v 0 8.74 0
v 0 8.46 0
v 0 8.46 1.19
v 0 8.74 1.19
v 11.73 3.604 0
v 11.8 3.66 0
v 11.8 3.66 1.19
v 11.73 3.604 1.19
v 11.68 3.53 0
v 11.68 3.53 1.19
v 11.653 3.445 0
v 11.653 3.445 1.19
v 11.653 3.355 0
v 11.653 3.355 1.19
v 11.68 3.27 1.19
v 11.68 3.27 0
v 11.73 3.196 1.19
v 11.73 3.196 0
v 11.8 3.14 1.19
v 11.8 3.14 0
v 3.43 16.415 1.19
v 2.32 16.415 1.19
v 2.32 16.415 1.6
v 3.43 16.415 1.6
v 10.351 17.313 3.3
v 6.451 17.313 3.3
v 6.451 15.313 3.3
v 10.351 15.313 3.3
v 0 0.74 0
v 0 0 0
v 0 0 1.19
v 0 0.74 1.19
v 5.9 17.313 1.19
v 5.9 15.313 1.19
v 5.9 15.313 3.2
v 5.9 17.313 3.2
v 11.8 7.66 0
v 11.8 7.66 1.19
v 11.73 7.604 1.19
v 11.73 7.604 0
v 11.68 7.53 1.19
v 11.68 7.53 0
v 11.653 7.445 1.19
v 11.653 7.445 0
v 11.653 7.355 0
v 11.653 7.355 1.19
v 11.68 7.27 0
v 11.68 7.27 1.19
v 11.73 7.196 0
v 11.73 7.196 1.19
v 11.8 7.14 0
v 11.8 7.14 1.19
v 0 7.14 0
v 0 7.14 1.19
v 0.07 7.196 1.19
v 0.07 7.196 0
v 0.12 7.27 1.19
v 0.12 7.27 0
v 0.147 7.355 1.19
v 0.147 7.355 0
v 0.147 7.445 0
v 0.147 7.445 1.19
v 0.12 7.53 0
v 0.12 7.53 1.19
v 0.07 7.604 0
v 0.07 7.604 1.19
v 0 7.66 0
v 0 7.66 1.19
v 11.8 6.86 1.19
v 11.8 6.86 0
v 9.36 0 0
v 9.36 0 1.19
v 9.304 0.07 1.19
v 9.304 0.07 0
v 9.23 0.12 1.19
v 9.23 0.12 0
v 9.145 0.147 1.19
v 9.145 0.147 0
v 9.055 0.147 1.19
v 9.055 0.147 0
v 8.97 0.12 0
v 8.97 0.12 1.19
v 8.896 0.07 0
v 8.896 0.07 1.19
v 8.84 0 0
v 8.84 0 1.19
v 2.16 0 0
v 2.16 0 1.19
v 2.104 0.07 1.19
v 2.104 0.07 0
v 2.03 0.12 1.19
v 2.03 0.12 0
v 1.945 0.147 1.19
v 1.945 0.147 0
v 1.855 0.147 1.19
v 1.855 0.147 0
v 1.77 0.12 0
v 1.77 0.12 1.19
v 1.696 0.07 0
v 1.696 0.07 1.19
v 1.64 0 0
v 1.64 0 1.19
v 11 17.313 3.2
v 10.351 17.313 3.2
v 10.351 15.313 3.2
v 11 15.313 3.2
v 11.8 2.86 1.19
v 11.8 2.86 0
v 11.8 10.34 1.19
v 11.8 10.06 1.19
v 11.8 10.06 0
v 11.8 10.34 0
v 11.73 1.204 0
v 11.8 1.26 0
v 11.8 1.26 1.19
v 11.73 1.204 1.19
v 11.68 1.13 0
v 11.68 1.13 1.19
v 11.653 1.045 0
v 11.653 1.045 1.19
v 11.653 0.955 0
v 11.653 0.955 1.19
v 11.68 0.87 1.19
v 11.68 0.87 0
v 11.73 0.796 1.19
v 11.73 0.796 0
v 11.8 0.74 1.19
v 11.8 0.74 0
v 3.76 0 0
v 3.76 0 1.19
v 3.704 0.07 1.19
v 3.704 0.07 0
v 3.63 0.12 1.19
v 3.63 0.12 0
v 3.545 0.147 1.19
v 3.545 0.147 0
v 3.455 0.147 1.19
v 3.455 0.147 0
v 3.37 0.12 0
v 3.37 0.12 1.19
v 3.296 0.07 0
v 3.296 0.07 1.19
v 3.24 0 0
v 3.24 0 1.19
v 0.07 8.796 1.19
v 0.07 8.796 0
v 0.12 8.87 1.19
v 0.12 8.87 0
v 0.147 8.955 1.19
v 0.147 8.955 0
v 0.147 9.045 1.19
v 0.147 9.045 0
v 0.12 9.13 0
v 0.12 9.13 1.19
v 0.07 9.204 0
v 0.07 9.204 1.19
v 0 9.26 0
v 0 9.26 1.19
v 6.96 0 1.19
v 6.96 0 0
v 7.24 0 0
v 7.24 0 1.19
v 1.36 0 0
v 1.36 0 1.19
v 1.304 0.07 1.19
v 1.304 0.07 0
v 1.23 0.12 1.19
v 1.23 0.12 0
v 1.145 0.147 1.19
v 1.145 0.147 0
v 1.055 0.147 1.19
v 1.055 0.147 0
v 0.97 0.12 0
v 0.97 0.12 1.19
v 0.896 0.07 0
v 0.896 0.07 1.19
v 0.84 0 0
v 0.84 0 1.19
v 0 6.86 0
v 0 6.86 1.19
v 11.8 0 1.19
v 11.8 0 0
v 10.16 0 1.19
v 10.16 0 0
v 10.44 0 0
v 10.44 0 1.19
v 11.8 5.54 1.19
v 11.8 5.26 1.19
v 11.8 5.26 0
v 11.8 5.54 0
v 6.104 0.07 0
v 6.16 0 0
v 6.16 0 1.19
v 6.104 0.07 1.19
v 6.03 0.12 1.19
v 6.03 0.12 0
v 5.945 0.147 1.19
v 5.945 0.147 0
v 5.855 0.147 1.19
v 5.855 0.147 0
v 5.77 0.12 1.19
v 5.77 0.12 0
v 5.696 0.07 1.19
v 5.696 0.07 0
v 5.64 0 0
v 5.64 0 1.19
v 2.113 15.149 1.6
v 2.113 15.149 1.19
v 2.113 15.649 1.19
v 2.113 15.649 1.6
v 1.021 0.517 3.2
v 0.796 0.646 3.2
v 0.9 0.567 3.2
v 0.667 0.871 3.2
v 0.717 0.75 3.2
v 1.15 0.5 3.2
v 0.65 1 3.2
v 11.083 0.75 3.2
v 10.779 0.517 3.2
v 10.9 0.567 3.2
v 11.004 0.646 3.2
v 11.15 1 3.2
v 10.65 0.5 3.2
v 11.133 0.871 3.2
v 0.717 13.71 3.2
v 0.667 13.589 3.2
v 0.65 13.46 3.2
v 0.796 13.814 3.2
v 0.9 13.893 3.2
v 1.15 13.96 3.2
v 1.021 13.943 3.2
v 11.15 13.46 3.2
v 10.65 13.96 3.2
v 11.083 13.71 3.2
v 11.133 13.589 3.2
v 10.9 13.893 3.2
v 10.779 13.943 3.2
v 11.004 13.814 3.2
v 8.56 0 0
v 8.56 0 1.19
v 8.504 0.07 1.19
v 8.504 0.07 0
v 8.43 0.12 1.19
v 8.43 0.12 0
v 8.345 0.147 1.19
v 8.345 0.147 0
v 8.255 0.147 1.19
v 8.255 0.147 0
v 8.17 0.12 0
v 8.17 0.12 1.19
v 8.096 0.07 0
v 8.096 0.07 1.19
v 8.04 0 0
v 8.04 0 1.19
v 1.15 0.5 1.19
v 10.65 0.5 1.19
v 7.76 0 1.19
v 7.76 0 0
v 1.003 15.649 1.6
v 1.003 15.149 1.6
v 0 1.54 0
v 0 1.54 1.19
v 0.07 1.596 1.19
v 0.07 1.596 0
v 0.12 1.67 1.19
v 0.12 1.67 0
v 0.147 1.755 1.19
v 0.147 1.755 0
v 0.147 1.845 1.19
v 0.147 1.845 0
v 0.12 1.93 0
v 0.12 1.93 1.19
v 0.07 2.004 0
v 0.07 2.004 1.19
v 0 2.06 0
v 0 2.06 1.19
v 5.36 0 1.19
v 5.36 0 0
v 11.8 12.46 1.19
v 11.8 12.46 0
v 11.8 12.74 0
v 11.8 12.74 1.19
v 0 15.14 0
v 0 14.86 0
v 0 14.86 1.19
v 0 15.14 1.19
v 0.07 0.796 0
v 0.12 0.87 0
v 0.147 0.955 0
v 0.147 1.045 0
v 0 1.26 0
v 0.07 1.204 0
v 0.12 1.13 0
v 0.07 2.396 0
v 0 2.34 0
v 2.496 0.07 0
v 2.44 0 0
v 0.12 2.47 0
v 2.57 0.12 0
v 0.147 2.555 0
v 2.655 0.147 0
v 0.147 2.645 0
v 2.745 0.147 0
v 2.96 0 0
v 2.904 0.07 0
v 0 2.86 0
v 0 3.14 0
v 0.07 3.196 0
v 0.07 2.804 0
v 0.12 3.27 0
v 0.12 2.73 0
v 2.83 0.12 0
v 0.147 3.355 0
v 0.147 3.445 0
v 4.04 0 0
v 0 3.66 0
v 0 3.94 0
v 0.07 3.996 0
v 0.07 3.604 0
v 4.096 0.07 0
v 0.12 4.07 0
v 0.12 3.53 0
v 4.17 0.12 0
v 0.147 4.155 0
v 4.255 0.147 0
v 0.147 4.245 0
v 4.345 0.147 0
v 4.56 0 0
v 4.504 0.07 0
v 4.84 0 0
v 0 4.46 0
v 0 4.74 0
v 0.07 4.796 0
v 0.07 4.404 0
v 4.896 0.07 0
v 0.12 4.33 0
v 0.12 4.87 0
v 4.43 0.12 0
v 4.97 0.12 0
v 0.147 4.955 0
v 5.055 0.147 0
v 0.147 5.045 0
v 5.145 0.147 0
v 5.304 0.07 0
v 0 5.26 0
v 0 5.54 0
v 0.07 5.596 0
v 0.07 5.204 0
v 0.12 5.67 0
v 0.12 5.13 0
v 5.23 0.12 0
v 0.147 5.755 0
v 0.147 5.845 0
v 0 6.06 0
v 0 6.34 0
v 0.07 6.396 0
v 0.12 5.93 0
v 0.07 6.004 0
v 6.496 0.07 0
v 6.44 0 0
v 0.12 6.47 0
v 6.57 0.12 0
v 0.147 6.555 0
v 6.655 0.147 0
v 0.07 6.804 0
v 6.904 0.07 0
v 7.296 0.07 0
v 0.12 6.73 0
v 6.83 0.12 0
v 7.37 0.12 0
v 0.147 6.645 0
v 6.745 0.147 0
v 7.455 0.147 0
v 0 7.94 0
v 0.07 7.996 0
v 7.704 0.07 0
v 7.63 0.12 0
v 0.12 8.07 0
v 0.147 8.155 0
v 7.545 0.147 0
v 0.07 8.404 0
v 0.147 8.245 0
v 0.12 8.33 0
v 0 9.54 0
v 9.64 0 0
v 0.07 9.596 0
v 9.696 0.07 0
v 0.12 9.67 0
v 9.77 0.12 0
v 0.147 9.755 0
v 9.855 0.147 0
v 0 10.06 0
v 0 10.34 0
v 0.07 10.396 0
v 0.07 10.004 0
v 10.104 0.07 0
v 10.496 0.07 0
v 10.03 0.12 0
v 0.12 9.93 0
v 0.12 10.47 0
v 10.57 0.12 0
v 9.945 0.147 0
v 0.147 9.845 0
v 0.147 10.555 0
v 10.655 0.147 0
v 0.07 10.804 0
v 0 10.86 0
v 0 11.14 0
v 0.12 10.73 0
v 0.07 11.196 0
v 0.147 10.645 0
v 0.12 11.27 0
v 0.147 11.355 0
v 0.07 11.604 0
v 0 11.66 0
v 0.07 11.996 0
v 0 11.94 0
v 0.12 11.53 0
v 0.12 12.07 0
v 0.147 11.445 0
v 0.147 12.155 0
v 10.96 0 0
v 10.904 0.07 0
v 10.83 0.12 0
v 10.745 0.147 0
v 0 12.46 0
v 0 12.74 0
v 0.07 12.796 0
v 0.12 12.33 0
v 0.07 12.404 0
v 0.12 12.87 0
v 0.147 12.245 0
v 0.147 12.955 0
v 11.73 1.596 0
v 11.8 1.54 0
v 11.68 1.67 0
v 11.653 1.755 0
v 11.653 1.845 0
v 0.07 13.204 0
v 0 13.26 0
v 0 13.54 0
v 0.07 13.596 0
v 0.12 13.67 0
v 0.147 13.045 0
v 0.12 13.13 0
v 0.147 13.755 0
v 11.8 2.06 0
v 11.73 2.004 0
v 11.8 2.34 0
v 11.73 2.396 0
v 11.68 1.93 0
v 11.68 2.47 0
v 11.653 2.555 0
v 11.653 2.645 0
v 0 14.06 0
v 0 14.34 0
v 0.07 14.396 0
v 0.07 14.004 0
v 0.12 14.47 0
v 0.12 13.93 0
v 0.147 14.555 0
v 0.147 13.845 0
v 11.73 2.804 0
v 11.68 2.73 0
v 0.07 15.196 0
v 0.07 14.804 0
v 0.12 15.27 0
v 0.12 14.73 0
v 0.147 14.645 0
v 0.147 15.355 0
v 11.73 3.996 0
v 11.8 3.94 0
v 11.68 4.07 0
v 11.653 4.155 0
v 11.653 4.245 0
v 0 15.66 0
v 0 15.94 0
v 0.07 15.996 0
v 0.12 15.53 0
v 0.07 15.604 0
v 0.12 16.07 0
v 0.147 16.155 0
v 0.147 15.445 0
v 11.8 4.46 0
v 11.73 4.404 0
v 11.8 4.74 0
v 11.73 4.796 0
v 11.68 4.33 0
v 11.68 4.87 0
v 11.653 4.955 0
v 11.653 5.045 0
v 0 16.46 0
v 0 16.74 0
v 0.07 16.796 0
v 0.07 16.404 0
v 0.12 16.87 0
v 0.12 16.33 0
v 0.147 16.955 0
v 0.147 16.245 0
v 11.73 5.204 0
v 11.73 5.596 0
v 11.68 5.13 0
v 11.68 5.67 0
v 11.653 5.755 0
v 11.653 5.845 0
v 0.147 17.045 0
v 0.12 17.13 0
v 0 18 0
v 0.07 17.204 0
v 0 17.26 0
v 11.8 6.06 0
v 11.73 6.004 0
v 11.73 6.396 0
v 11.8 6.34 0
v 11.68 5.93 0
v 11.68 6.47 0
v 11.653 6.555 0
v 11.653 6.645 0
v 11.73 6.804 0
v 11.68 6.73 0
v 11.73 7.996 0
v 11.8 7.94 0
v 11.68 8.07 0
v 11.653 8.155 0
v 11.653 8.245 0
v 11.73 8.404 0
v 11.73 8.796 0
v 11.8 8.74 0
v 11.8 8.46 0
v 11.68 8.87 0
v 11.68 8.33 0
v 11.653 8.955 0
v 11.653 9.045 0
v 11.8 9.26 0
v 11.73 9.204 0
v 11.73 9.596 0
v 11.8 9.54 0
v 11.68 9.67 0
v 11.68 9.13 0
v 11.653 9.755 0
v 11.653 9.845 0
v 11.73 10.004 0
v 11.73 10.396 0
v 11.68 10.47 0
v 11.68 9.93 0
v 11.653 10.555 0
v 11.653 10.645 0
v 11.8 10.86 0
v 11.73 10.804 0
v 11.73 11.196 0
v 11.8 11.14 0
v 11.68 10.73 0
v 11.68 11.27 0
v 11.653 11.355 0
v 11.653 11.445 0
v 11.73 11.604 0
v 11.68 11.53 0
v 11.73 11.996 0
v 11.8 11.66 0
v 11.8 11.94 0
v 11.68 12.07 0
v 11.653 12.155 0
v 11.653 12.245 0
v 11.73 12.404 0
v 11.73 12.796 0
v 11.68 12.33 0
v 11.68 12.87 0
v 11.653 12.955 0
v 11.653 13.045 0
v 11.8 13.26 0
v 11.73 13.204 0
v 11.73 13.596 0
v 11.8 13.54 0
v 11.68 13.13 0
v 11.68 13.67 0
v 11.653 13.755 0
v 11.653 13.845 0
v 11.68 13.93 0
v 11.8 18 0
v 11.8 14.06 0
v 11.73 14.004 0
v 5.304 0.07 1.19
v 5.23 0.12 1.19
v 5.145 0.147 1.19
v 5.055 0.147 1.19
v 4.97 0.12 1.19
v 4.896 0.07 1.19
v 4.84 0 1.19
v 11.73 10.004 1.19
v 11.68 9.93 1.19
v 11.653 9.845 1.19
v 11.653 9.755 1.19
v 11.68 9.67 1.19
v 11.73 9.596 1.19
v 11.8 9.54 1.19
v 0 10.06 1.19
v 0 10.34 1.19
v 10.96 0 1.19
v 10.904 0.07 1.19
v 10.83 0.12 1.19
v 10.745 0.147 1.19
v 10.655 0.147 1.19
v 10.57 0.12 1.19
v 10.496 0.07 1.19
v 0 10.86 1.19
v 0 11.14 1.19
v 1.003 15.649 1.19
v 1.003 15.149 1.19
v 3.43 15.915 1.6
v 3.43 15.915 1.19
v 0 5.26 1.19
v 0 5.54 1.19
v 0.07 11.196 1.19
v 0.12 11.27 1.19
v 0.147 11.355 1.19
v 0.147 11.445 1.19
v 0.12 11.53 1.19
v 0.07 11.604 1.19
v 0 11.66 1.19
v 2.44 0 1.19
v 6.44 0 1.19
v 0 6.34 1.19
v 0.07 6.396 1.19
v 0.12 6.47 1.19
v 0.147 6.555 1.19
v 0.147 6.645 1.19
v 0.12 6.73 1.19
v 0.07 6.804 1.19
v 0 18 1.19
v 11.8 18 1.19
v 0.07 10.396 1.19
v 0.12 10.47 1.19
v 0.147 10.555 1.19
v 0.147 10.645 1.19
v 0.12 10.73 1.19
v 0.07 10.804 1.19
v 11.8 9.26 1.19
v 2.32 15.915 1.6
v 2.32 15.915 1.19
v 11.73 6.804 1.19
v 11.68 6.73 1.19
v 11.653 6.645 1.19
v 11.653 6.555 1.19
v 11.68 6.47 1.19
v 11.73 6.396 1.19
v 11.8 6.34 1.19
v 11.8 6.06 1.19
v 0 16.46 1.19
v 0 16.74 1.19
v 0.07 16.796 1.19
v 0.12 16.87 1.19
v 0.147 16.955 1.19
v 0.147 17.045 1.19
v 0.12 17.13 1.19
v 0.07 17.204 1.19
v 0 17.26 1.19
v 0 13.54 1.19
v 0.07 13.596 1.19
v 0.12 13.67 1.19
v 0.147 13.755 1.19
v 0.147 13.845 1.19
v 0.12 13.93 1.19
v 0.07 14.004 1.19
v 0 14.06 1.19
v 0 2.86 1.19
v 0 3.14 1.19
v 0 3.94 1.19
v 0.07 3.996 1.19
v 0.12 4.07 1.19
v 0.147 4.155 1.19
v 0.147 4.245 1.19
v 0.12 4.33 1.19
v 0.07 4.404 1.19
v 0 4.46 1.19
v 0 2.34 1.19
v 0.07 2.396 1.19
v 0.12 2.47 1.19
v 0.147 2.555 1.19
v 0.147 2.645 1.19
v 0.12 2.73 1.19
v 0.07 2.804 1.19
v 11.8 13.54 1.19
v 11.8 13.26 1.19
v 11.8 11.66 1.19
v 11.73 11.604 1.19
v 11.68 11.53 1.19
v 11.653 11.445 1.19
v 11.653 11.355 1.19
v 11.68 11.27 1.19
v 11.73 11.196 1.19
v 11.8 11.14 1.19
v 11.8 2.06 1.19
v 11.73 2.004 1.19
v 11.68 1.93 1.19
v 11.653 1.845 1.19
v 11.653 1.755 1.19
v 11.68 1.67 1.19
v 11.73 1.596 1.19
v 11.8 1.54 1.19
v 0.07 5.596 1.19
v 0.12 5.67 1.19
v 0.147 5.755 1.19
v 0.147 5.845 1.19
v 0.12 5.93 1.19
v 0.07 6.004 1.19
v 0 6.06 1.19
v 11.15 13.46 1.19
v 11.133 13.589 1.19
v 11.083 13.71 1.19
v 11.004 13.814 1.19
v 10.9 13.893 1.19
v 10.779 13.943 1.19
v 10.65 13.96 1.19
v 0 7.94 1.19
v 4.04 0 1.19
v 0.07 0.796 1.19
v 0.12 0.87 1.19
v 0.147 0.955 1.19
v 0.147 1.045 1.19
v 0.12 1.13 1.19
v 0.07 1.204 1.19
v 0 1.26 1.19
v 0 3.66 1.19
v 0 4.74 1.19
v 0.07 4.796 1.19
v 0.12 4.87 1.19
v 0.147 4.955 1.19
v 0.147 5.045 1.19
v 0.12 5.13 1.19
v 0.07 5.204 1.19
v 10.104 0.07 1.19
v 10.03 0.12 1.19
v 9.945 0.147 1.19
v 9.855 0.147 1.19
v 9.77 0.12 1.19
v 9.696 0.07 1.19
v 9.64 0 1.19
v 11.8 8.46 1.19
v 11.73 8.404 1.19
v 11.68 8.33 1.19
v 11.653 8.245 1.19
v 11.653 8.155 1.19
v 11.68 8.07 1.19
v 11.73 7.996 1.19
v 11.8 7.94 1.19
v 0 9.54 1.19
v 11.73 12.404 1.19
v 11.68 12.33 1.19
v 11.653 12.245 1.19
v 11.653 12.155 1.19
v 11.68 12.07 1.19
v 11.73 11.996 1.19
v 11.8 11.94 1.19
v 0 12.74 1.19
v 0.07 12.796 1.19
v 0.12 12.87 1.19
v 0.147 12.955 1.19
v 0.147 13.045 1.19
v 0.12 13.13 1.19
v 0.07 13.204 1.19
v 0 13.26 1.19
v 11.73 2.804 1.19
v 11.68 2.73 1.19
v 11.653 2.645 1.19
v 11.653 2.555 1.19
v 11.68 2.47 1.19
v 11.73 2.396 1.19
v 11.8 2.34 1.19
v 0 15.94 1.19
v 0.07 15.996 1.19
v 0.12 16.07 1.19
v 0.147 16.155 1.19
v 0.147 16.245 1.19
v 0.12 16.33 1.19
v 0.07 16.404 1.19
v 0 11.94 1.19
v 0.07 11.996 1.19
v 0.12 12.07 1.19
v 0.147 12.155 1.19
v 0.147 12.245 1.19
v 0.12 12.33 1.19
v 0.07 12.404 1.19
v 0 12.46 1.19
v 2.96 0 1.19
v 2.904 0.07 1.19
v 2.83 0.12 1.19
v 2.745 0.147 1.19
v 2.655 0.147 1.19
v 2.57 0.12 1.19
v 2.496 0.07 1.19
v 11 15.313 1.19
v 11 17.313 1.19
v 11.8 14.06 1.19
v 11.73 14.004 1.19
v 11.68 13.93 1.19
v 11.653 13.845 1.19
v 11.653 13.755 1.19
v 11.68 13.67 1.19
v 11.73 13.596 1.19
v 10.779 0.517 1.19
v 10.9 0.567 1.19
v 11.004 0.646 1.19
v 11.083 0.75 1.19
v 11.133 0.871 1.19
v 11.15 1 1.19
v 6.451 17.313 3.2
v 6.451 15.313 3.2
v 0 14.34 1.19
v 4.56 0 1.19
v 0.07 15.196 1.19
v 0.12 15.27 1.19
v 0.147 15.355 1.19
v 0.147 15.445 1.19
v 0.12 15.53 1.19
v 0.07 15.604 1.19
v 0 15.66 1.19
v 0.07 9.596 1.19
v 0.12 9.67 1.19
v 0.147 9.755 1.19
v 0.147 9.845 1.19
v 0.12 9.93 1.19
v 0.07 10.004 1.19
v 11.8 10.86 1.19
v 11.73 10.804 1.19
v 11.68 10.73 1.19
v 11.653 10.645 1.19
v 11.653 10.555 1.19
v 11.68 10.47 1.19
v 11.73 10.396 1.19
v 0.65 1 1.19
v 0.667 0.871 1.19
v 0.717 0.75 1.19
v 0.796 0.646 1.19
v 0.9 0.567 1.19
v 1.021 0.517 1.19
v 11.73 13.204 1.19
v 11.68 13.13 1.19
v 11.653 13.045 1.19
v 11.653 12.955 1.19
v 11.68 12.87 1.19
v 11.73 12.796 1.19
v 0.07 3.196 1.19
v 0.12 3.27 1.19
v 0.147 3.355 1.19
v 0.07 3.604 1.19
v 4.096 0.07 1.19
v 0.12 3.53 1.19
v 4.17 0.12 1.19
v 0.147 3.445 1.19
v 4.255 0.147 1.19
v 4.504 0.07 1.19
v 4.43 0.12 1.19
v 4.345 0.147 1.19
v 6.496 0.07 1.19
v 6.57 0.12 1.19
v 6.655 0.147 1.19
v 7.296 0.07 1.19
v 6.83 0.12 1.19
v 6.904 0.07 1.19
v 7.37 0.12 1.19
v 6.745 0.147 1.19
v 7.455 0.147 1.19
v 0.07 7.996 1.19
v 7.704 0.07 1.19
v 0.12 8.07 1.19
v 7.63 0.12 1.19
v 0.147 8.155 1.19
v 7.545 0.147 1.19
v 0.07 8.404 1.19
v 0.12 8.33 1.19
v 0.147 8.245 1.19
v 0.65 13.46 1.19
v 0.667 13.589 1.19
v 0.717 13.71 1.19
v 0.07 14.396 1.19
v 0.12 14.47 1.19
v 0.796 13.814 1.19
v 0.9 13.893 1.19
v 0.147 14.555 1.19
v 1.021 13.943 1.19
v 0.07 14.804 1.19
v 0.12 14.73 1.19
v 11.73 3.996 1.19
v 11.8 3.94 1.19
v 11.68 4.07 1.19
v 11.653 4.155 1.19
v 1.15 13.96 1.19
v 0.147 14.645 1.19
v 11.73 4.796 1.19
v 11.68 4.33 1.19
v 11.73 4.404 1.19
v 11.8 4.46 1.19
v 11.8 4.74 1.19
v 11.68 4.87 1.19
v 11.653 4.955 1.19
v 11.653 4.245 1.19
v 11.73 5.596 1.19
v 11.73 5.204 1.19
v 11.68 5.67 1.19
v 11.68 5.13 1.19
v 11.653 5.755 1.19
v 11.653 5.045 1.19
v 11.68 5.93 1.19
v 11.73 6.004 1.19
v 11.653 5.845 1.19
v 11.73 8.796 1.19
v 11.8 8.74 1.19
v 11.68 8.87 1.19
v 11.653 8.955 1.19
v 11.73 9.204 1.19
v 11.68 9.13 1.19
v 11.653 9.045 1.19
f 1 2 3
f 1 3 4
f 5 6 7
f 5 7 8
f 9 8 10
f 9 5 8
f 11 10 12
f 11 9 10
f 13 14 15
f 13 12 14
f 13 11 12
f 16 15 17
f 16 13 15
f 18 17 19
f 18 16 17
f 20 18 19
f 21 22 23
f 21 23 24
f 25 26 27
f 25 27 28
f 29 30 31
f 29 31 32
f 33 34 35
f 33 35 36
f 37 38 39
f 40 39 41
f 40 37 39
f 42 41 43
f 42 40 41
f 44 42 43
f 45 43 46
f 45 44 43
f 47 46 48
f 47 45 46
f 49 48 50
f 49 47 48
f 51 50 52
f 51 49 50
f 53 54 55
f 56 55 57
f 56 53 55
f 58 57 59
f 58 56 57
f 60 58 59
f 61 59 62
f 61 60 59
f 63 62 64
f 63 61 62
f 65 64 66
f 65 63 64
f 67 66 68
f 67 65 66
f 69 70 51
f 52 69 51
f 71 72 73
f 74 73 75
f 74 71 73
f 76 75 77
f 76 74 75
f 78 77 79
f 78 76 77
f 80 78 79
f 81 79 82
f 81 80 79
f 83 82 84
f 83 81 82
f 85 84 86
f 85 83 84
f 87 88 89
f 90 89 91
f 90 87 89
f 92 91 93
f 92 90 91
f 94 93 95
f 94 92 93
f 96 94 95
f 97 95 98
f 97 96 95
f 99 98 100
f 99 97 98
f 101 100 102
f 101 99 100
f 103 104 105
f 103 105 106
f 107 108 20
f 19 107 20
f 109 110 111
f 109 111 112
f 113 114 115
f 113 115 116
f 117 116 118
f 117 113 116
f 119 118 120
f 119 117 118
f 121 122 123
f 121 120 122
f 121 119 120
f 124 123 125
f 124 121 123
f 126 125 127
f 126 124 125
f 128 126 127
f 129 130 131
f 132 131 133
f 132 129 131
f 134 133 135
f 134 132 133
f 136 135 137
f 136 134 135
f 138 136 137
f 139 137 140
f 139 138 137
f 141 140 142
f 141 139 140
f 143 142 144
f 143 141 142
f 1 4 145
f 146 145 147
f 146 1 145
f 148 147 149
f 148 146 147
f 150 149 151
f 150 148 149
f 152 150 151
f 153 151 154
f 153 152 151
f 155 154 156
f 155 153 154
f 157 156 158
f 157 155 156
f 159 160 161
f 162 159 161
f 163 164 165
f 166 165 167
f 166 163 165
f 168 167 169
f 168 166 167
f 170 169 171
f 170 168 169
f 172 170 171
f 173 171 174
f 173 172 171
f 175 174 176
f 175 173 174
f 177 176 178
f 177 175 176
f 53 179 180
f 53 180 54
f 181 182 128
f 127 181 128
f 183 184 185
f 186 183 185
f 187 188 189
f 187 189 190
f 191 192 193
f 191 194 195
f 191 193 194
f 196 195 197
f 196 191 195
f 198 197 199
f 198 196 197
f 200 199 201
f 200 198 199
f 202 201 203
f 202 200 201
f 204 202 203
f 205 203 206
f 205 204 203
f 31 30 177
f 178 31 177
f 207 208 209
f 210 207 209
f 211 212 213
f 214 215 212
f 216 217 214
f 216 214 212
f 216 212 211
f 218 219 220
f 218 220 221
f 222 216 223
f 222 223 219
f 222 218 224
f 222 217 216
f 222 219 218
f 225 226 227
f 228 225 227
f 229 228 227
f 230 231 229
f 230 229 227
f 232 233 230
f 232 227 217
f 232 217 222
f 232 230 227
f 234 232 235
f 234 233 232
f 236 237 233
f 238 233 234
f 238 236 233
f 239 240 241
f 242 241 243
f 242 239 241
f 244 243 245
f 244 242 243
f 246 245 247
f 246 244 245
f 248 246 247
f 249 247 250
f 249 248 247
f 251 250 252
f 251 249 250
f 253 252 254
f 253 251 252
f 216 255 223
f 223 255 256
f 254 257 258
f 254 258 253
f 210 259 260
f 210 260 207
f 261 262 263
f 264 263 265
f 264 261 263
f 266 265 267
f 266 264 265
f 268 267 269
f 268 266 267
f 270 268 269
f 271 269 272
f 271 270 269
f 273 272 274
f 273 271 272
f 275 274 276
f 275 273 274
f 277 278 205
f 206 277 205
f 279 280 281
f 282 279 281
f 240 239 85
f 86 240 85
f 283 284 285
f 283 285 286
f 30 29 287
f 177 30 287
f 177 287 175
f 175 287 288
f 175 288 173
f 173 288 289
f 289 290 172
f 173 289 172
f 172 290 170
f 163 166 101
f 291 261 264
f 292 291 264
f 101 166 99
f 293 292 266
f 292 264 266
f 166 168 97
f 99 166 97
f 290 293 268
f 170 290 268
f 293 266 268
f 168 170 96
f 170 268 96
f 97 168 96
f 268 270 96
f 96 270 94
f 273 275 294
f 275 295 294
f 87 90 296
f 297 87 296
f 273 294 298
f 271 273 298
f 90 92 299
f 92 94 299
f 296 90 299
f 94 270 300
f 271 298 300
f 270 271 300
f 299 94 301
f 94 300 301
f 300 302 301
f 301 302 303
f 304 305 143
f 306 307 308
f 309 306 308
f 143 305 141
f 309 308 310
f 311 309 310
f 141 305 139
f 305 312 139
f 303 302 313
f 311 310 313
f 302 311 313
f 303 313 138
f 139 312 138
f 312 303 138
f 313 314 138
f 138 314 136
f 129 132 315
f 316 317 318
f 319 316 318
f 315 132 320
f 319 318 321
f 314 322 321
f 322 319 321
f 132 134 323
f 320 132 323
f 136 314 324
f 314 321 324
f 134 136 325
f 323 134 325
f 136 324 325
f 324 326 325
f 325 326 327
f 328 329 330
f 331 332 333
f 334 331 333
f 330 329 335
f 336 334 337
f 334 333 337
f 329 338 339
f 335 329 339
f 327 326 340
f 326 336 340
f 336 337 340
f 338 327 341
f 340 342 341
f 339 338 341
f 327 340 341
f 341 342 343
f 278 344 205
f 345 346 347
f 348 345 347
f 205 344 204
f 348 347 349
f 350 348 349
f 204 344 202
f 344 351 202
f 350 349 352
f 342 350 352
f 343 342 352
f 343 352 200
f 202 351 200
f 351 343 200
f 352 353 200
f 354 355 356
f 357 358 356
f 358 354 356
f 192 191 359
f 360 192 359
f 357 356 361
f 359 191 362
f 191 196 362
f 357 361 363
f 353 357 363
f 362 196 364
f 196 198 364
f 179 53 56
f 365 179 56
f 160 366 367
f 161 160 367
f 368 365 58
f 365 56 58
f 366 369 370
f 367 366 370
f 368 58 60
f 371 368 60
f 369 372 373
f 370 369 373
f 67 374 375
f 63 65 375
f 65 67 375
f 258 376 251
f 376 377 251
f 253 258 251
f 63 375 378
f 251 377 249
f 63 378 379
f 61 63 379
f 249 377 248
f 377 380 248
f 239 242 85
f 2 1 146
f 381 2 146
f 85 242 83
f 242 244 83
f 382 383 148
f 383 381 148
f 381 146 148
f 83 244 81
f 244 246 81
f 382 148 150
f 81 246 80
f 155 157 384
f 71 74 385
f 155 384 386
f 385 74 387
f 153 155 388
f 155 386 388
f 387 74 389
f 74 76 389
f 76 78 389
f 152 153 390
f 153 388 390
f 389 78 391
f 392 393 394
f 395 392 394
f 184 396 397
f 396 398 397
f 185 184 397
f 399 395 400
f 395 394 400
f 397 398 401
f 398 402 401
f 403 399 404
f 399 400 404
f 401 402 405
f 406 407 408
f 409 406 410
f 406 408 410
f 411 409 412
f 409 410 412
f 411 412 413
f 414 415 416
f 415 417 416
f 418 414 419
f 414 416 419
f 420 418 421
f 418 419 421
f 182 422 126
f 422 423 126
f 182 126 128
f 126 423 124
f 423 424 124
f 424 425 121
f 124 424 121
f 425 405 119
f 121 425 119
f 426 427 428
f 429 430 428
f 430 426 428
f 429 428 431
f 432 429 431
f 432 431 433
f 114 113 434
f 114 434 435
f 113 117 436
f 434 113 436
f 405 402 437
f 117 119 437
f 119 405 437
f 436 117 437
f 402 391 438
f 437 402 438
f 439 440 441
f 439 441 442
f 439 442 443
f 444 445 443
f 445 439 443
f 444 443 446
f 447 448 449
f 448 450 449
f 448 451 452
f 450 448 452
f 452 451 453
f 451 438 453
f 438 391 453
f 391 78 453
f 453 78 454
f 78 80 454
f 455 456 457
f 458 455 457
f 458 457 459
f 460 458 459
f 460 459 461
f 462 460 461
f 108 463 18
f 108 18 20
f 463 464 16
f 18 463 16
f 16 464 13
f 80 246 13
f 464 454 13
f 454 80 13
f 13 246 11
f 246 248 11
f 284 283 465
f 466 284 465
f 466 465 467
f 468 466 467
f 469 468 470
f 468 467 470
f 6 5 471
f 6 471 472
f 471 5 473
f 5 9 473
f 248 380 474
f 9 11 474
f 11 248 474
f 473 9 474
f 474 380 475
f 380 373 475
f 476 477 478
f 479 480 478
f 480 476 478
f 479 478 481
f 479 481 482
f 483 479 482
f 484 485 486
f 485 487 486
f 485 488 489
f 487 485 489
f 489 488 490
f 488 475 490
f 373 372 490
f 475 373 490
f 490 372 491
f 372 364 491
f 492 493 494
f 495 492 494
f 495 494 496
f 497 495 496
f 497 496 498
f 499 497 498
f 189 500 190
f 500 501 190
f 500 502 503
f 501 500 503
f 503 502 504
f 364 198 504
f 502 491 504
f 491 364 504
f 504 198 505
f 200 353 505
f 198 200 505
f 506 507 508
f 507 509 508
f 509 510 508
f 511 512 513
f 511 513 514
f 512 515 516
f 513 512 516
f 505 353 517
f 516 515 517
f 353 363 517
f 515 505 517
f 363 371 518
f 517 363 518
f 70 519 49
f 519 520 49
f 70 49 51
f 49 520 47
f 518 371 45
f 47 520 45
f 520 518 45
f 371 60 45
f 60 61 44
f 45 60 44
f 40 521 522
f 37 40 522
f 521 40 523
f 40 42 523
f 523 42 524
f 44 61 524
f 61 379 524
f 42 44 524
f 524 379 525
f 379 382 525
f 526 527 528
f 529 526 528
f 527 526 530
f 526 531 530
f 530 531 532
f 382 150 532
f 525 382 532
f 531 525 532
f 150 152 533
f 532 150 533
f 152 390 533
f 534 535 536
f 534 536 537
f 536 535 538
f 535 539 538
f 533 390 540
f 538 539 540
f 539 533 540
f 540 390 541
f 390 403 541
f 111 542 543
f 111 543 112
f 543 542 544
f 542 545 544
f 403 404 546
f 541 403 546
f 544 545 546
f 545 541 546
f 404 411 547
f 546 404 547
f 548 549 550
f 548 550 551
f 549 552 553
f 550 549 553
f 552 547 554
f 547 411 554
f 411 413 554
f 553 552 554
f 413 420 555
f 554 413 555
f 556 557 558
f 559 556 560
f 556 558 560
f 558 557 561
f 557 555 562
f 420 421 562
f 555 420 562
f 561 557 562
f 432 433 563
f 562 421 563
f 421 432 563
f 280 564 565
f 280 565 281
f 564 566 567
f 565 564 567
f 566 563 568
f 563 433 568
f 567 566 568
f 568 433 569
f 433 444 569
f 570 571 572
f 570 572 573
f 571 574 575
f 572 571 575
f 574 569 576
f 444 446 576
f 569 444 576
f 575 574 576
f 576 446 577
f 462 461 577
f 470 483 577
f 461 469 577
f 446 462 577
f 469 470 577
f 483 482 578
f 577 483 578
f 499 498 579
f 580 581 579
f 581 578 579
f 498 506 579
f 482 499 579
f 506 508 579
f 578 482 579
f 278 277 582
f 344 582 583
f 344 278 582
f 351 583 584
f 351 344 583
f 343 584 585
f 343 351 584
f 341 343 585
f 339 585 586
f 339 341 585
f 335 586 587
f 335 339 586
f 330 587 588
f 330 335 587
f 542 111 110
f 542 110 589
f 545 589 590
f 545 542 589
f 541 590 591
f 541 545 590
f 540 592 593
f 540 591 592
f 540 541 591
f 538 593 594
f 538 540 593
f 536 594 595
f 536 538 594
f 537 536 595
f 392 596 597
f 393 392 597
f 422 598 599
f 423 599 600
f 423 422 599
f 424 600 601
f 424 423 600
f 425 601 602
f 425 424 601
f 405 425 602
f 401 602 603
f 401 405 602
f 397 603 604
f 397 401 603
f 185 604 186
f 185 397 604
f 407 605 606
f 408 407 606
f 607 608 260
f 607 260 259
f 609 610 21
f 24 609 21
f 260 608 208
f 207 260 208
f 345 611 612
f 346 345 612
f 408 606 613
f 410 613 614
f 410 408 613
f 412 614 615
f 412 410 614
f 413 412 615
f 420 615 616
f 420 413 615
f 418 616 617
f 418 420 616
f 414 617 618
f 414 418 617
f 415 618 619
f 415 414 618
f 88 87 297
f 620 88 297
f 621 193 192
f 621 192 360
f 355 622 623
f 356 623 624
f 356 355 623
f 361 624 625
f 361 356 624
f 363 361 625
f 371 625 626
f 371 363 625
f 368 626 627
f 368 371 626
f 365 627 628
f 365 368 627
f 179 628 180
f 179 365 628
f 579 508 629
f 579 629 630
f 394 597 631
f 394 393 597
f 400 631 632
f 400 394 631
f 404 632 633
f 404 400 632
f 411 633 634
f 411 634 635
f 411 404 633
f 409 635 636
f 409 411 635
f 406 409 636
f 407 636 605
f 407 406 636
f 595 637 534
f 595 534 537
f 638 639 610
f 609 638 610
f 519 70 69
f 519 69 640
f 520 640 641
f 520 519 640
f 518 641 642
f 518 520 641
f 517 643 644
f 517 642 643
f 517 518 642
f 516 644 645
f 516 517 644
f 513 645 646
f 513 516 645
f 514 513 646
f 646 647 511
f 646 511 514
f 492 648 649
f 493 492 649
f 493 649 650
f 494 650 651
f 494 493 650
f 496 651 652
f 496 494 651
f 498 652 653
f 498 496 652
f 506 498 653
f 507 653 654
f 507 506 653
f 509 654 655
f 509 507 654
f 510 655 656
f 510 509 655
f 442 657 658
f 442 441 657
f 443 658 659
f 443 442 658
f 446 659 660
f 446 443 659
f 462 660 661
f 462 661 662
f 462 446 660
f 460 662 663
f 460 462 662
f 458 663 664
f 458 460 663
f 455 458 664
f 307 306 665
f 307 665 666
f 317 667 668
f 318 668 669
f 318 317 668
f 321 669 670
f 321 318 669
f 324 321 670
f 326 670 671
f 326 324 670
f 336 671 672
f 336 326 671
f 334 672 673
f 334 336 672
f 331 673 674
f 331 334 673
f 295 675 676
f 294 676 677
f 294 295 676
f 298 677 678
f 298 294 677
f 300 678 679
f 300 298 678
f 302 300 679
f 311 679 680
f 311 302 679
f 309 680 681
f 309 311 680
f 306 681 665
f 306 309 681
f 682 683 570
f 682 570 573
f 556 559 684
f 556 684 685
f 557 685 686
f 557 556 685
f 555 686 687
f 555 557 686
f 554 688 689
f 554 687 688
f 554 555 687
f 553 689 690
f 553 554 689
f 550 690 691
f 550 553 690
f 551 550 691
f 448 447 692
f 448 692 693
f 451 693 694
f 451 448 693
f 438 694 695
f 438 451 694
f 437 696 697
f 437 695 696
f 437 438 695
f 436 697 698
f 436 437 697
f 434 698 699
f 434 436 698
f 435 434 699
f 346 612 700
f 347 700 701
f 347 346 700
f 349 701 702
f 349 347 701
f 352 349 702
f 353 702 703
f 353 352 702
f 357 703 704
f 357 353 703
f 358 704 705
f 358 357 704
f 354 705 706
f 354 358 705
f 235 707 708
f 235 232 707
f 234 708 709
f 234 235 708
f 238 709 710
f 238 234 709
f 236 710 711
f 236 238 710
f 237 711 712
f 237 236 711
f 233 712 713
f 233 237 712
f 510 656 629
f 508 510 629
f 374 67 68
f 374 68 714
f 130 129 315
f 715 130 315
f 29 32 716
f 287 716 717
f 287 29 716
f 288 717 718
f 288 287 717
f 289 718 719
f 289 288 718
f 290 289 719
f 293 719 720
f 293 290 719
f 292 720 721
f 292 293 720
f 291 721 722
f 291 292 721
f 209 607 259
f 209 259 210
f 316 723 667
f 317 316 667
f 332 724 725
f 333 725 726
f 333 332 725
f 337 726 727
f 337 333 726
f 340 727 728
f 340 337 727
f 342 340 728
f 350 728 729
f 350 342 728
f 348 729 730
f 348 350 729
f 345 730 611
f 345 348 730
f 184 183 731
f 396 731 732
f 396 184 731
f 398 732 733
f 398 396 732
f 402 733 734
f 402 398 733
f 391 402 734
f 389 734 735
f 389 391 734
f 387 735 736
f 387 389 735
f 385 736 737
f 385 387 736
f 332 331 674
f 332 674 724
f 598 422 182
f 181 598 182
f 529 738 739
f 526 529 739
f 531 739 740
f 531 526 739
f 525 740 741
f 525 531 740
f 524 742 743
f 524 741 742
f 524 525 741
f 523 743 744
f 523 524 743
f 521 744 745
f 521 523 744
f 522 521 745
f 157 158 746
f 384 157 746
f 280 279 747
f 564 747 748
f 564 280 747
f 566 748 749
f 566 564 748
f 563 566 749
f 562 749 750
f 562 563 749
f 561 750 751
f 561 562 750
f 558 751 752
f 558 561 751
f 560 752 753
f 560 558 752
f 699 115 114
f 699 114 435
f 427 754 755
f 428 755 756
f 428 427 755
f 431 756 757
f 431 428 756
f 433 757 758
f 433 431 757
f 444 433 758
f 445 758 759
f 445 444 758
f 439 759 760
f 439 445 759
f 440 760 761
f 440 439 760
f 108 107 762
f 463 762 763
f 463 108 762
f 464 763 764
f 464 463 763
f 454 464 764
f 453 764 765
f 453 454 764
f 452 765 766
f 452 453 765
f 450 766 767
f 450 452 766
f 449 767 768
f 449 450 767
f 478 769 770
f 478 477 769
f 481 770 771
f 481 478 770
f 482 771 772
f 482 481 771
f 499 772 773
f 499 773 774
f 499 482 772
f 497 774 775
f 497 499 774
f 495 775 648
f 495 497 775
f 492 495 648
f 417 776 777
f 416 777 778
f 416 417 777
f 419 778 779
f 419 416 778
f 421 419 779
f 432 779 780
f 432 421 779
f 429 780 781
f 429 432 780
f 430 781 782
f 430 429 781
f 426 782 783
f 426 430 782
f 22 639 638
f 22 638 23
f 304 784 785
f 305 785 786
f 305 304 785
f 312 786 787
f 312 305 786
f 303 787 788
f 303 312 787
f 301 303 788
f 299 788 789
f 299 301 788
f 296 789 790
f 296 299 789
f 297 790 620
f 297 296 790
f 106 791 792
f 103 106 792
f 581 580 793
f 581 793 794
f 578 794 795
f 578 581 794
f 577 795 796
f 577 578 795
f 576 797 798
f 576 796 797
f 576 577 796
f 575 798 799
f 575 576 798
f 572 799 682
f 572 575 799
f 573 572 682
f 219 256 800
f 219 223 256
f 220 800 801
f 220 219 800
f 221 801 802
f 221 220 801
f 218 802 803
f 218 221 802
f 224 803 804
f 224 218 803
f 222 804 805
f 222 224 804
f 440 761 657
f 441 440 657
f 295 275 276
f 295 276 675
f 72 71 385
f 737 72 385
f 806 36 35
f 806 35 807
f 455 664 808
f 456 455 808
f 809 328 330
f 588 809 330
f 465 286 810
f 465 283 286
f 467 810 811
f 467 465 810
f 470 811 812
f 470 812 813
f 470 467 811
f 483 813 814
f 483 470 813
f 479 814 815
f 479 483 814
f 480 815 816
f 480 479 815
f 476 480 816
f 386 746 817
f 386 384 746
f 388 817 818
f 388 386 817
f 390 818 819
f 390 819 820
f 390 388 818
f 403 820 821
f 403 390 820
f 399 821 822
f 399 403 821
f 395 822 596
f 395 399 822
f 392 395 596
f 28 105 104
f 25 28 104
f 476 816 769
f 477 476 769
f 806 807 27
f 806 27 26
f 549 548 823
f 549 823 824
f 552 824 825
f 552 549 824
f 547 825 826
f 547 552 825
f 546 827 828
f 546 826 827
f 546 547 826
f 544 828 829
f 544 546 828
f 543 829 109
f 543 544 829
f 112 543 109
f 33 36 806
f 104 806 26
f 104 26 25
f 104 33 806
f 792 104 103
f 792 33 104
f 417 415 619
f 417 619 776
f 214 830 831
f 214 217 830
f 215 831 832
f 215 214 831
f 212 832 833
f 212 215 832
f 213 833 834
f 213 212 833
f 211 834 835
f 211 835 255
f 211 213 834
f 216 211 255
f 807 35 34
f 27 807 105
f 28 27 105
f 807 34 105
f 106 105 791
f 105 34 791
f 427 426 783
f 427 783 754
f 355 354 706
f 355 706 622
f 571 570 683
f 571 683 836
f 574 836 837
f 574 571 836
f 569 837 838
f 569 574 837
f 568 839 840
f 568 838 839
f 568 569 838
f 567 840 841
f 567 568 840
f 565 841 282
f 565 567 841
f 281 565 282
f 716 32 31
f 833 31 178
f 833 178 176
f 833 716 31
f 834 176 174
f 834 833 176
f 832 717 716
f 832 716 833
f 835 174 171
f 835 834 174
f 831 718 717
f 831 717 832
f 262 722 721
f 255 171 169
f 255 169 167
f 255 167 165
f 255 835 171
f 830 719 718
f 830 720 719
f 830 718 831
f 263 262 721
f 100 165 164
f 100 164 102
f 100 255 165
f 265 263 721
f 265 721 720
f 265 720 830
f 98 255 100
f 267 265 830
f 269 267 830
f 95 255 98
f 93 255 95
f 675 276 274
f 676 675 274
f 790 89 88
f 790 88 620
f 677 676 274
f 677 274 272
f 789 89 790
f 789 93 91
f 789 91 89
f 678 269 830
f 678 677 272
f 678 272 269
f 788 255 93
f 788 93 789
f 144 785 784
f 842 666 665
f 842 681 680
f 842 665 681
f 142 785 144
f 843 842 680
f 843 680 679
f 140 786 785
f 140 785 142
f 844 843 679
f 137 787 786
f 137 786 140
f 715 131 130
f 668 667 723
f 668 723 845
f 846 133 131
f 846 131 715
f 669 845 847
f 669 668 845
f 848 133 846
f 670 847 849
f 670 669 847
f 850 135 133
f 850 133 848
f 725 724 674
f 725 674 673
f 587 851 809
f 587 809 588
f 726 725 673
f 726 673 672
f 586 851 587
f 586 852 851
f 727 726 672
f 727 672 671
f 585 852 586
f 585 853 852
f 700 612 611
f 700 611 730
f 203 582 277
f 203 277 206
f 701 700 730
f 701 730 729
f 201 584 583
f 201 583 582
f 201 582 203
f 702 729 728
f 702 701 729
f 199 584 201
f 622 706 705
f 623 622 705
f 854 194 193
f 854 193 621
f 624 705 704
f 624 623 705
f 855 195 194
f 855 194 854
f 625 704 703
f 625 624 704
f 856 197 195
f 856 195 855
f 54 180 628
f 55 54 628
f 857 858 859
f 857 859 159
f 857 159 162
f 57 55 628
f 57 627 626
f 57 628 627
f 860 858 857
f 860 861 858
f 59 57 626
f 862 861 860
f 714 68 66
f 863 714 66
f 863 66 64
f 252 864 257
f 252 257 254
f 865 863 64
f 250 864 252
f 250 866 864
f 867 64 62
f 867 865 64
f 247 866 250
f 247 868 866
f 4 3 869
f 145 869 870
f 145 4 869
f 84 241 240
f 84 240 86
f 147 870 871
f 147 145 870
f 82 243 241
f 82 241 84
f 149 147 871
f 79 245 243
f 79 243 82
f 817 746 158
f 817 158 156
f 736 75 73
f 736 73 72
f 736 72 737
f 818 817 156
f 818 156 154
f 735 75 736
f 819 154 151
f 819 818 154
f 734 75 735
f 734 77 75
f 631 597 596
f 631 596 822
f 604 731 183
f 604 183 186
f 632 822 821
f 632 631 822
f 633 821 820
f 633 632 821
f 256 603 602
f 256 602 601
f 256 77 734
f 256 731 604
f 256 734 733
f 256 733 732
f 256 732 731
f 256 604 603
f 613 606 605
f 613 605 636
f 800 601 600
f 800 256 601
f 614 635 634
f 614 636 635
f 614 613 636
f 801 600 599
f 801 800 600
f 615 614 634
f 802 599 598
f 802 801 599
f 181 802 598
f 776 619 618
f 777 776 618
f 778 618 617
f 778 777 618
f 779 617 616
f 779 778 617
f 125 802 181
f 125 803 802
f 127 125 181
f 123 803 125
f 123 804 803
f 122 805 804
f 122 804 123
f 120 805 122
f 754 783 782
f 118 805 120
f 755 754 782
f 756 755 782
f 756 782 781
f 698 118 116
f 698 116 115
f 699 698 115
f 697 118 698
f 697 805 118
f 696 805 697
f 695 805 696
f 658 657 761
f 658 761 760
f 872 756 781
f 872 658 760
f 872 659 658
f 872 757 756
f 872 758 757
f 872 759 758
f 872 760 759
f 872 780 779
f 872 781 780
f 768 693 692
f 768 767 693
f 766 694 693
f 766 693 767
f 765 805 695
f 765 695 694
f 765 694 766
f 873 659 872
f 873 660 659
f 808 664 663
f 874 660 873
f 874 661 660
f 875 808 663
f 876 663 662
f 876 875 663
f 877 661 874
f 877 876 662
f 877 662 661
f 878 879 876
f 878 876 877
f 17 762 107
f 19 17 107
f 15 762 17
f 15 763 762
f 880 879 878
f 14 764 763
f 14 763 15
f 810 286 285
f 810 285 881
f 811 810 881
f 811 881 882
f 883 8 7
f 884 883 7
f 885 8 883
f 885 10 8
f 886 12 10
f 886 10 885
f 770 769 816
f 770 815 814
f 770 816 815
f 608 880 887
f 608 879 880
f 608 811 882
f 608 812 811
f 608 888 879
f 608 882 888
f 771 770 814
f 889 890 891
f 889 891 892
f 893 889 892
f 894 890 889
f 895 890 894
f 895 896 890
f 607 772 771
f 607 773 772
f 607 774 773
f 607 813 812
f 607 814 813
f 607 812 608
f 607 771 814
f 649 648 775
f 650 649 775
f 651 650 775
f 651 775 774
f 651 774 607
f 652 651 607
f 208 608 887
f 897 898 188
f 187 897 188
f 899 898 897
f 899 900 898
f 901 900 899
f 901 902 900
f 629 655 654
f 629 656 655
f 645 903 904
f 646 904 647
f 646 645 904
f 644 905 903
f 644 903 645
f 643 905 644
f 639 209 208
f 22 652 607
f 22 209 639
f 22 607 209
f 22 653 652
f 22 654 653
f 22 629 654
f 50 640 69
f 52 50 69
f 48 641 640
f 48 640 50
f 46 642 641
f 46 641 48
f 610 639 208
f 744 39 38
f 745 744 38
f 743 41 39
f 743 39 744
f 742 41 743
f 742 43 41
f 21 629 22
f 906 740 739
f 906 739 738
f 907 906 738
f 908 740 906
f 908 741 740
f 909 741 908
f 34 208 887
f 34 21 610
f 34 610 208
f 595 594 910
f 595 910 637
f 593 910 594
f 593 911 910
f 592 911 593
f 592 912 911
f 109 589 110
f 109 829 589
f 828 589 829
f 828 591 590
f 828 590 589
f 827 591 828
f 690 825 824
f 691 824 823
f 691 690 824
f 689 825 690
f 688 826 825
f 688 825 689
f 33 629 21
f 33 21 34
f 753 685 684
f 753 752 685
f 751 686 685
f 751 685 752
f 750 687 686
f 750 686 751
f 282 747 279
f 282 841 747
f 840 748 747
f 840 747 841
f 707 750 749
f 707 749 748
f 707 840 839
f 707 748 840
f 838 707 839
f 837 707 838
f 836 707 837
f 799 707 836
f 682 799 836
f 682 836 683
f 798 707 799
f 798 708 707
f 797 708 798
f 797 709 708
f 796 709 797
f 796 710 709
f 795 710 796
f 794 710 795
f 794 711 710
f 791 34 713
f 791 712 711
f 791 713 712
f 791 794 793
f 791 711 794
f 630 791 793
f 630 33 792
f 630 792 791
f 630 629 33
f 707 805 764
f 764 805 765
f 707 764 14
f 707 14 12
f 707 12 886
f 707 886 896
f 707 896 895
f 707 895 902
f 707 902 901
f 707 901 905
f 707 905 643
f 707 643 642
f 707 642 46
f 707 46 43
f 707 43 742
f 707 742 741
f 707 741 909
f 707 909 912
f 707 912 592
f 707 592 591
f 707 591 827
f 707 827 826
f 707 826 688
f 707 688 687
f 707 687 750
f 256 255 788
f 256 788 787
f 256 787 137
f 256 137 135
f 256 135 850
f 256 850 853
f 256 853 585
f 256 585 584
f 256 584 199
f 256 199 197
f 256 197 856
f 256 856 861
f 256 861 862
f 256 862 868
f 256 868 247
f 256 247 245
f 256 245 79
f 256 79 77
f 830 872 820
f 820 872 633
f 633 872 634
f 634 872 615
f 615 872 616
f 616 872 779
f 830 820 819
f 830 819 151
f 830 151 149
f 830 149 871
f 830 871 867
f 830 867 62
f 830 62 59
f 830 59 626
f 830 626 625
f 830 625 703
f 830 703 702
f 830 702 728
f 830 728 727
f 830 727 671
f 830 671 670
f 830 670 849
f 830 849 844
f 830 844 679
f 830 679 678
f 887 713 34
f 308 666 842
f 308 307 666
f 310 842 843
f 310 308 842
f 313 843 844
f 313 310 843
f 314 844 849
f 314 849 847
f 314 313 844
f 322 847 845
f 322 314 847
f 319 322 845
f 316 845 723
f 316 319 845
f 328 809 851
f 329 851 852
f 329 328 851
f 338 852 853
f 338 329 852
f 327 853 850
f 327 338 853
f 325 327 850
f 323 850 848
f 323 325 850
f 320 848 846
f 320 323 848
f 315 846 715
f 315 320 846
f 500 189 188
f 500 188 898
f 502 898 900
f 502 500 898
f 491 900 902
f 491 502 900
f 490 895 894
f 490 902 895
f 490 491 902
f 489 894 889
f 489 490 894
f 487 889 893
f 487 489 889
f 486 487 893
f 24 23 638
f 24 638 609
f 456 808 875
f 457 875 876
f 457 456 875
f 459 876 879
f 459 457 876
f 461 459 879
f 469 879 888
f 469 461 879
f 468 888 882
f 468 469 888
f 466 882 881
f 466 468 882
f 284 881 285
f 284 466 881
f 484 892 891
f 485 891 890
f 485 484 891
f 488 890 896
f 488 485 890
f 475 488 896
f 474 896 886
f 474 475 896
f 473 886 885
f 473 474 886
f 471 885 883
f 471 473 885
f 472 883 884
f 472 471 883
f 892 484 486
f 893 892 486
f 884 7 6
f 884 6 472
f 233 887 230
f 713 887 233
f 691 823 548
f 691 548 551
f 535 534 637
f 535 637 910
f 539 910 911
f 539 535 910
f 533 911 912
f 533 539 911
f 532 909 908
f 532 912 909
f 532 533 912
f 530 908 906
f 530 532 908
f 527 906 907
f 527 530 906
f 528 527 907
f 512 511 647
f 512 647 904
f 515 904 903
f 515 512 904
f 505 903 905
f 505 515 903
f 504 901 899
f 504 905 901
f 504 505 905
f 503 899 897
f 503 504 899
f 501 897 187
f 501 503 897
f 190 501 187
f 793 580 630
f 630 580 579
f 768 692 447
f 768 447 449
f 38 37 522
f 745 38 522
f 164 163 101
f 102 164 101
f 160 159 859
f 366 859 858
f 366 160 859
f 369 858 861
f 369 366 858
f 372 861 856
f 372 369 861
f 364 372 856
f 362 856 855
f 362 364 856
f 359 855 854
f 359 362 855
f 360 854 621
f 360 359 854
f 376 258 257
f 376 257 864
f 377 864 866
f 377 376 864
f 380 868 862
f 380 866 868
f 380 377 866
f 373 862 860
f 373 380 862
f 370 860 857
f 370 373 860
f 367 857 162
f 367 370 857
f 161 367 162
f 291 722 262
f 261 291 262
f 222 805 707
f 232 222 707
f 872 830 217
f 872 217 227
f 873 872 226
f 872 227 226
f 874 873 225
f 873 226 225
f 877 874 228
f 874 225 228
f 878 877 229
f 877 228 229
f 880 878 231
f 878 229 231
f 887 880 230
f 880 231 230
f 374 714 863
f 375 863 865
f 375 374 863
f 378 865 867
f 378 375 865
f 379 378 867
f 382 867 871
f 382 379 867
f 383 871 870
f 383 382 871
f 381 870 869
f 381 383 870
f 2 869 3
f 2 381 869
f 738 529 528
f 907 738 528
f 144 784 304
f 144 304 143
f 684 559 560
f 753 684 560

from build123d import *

# Parameters (mm, degrees)
SKETCH1_W               = 11.8
SKETCH1_H               = 18
BOSS_EXTRUDE1_DEPTH     = 1.19
SKETCH2_W               = 10.5
SKETCH2_H               = 13.46
BOSS_EXTRUDE2_DEPTH     = 3.2
FILLET11_R              = 0.5
FILLET12_R              = 0.5
FILLET13_R              = 0.5
FILLET14_R              = 0.5
SKETCH9_R               = 0.3
CUT_EXTRUDE5_DEPTH      = 3.2
SKETCH14_W              = 5.1
SKETCH14_H              = 2
BOSS_EXTRUDE3_DEPTH     = 3.2
SKETCH15_W              = 3.9
SKETCH15_H              = 2
BOSS_EXTRUDE4_DEPTH     = 3.3
SKETCH16_R              = 0.3
CUT_EXTRUDE6_DEPTH      = 4.3
CUT_EXTRUDE6_DEPTH_BACK = 1
SKETCH17_R              = 0.3
CUT_EXTRUDE9_DEPTH      = 4.3
CUT_EXTRUDE9_DEPTH_BACK = 3.2
SKETCH19_W              = 1.11
SKETCH19_H              = 0.5
BOSS_EXTRUDE6_DEPTH     = 1.6
SKETCH20_W              = 1.11
SKETCH20_H              = 0.5
BOSS_EXTRUDE7_DEPTH     = 1.6


with BuildPart() as part:
    # Sketch1 → Boss-Extrude1 (new body)
    with BuildSketch(Plane.XY):
        with Locations((5.9, 9)):
            Rectangle(SKETCH1_W, SKETCH1_H)
    extrude(amount=BOSS_EXTRUDE1_DEPTH)

    # Sketch2 → Boss-Extrude2 (add)
    with BuildSketch(Plane.XY):
        with Locations((5.9, 7.23)):
            Rectangle(SKETCH2_W, SKETCH2_H)
    extrude(amount=BOSS_EXTRUDE2_DEPTH)

    # Fillet11
    fillet11_edges = [part.edges().sort_by_distance(p)[0] for p in [
        (0.65, 13.96, 2.195),
    ]]
    fillet(fillet11_edges, radius=FILLET11_R)

    # Fillet12
    fillet12_edges = [part.edges().sort_by_distance(p)[0] for p in [
        (0.65, 0.5, 2.195),
    ]]
    fillet(fillet12_edges, radius=FILLET12_R)

    # Fillet13
    fillet13_edges = [part.edges().sort_by_distance(p)[0] for p in [
        (11.15, 0.5, 2.195),
    ]]
    fillet(fillet13_edges, radius=FILLET13_R)

    # Fillet14
    fillet14_edges = [part.edges().sort_by_distance(p)[0] for p in [
        (11.15, 13.96, 2.195),
    ]]
    fillet(fillet14_edges, radius=FILLET14_R)

    # Sketch9 → Cut-Extrude5 (cut)
    with BuildSketch(Plane.XY):
        with Locations((1.1, -0.15)):
            Circle(SKETCH9_R)
        with Locations((1.9, -0.15)):
            Circle(SKETCH9_R)
        with Locations((2.7, -0.15)):
            Circle(SKETCH9_R)
        with Locations((3.5, -0.15)):
            Circle(SKETCH9_R)
        with Locations((4.3, -0.15)):
            Circle(SKETCH9_R)
        with Locations((5.1, -0.15)):
            Circle(SKETCH9_R)
        with Locations((5.9, -0.15)):
            Circle(SKETCH9_R)
        with Locations((6.7, -0.15)):
            Circle(SKETCH9_R)
        with Locations((7.5, -0.15)):
            Circle(SKETCH9_R)
        with Locations((8.3, -0.15)):
            Circle(SKETCH9_R)
        with Locations((9.1, -0.15)):
            Circle(SKETCH9_R)
        with Locations((9.9, -0.15)):
            Circle(SKETCH9_R)
        with Locations((10.7, -0.15)):
            Circle(SKETCH9_R)
    extrude(amount=CUT_EXTRUDE5_DEPTH, mode=Mode.SUBTRACT)

    # Sketch14 → Boss-Extrude3 (add)
    with BuildSketch(Plane.XY):
        with Locations((8.45, 16.312688451)):
            Rectangle(SKETCH14_W, SKETCH14_H)
    extrude(amount=BOSS_EXTRUDE3_DEPTH)

    # Sketch15 → Boss-Extrude4 (add)
    with BuildSketch(Plane.XY):
        with Locations((8.401012654, 16.312688451)):
            Rectangle(SKETCH15_W, SKETCH15_H)
    extrude(amount=BOSS_EXTRUDE4_DEPTH)

    # Sketch16 → Cut-Extrude6 (cut, two sides)
    with BuildSketch(Plane.XY) as cut_extrude6_sk:
        with Locations((-0.15, 1)):
            Circle(SKETCH16_R)
        with Locations((-0.15, 1.8)):
            Circle(SKETCH16_R)
        with Locations((-0.15, 2.6)):
            Circle(SKETCH16_R)
        with Locations((-0.15, 3.4)):
            Circle(SKETCH16_R)
        with Locations((-0.15, 4.2)):
            Circle(SKETCH16_R)
        with Locations((-0.15, 5)):
            Circle(SKETCH16_R)
        with Locations((-0.15, 5.8)):
            Circle(SKETCH16_R)
        with Locations((-0.15, 6.6)):
            Circle(SKETCH16_R)
        with Locations((-0.15, 7.4)):
            Circle(SKETCH16_R)
        with Locations((-0.15, 8.2)):
            Circle(SKETCH16_R)
        with Locations((-0.15, 9)):
            Circle(SKETCH16_R)
        with Locations((-0.15, 9.8)):
            Circle(SKETCH16_R)
        with Locations((-0.15, 10.6)):
            Circle(SKETCH16_R)
        with Locations((-0.15, 11.4)):
            Circle(SKETCH16_R)
        with Locations((-0.15, 12.2)):
            Circle(SKETCH16_R)
        with Locations((-0.15, 13)):
            Circle(SKETCH16_R)
        with Locations((-0.15, 13.8)):
            Circle(SKETCH16_R)
        with Locations((-0.15, 14.6)):
            Circle(SKETCH16_R)
        with Locations((-0.15, 15.4)):
            Circle(SKETCH16_R)
        with Locations((-0.15, 16.2)):
            Circle(SKETCH16_R)
        with Locations((-0.15, 17)):
            Circle(SKETCH16_R)
    extrude(amount=CUT_EXTRUDE6_DEPTH, mode=Mode.SUBTRACT)
    extrude(cut_extrude6_sk.sketch, amount=-CUT_EXTRUDE6_DEPTH_BACK, mode=Mode.SUBTRACT)

    # Sketch17 → Cut-Extrude9 (cut, two sides)
    with BuildSketch(Plane.XY) as cut_extrude9_sk:
        with Locations((11.95, 1)):
            Circle(SKETCH17_R)
        with Locations((11.95, 1.8)):
            Circle(SKETCH17_R)
        with Locations((11.95, 2.6)):
            Circle(SKETCH17_R)
        with Locations((11.95, 3.4)):
            Circle(SKETCH17_R)
        with Locations((11.95, 4.2)):
            Circle(SKETCH17_R)
        with Locations((11.95, 5)):
            Circle(SKETCH17_R)
        with Locations((11.95, 5.8)):
            Circle(SKETCH17_R)
        with Locations((11.95, 6.6)):
            Circle(SKETCH17_R)
        with Locations((11.95, 7.4)):
            Circle(SKETCH17_R)
        with Locations((11.95, 8.2)):
            Circle(SKETCH17_R)
        with Locations((11.95, 9)):
            Circle(SKETCH17_R)
        with Locations((11.95, 9.8)):
            Circle(SKETCH17_R)
        with Locations((11.95, 10.6)):
            Circle(SKETCH17_R)
        with Locations((11.95, 11.4)):
            Circle(SKETCH17_R)
        with Locations((11.95, 12.2)):
            Circle(SKETCH17_R)
        with Locations((11.95, 13)):
            Circle(SKETCH17_R)
        with Locations((11.95, 13.8)):
            Circle(SKETCH17_R)
    extrude(amount=CUT_EXTRUDE9_DEPTH, mode=Mode.SUBTRACT)
    extrude(cut_extrude9_sk.sketch, amount=-CUT_EXTRUDE9_DEPTH_BACK, mode=Mode.SUBTRACT)

    # Sketch19 → Boss-Extrude6 (add)
    with BuildSketch(Plane.XY):
        with Locations((2.875, 16.16471376)):
            Rectangle(SKETCH19_W, SKETCH19_H)
    extrude(amount=BOSS_EXTRUDE6_DEPTH)

    # Sketch20 → Boss-Extrude7 (add)
    with BuildSketch(Plane.XY):
        with Locations((1.55773637, 15.39942892)):
            Rectangle(SKETCH20_W, SKETCH20_H)
    extrude(amount=BOSS_EXTRUDE7_DEPTH)


solid = part.part
